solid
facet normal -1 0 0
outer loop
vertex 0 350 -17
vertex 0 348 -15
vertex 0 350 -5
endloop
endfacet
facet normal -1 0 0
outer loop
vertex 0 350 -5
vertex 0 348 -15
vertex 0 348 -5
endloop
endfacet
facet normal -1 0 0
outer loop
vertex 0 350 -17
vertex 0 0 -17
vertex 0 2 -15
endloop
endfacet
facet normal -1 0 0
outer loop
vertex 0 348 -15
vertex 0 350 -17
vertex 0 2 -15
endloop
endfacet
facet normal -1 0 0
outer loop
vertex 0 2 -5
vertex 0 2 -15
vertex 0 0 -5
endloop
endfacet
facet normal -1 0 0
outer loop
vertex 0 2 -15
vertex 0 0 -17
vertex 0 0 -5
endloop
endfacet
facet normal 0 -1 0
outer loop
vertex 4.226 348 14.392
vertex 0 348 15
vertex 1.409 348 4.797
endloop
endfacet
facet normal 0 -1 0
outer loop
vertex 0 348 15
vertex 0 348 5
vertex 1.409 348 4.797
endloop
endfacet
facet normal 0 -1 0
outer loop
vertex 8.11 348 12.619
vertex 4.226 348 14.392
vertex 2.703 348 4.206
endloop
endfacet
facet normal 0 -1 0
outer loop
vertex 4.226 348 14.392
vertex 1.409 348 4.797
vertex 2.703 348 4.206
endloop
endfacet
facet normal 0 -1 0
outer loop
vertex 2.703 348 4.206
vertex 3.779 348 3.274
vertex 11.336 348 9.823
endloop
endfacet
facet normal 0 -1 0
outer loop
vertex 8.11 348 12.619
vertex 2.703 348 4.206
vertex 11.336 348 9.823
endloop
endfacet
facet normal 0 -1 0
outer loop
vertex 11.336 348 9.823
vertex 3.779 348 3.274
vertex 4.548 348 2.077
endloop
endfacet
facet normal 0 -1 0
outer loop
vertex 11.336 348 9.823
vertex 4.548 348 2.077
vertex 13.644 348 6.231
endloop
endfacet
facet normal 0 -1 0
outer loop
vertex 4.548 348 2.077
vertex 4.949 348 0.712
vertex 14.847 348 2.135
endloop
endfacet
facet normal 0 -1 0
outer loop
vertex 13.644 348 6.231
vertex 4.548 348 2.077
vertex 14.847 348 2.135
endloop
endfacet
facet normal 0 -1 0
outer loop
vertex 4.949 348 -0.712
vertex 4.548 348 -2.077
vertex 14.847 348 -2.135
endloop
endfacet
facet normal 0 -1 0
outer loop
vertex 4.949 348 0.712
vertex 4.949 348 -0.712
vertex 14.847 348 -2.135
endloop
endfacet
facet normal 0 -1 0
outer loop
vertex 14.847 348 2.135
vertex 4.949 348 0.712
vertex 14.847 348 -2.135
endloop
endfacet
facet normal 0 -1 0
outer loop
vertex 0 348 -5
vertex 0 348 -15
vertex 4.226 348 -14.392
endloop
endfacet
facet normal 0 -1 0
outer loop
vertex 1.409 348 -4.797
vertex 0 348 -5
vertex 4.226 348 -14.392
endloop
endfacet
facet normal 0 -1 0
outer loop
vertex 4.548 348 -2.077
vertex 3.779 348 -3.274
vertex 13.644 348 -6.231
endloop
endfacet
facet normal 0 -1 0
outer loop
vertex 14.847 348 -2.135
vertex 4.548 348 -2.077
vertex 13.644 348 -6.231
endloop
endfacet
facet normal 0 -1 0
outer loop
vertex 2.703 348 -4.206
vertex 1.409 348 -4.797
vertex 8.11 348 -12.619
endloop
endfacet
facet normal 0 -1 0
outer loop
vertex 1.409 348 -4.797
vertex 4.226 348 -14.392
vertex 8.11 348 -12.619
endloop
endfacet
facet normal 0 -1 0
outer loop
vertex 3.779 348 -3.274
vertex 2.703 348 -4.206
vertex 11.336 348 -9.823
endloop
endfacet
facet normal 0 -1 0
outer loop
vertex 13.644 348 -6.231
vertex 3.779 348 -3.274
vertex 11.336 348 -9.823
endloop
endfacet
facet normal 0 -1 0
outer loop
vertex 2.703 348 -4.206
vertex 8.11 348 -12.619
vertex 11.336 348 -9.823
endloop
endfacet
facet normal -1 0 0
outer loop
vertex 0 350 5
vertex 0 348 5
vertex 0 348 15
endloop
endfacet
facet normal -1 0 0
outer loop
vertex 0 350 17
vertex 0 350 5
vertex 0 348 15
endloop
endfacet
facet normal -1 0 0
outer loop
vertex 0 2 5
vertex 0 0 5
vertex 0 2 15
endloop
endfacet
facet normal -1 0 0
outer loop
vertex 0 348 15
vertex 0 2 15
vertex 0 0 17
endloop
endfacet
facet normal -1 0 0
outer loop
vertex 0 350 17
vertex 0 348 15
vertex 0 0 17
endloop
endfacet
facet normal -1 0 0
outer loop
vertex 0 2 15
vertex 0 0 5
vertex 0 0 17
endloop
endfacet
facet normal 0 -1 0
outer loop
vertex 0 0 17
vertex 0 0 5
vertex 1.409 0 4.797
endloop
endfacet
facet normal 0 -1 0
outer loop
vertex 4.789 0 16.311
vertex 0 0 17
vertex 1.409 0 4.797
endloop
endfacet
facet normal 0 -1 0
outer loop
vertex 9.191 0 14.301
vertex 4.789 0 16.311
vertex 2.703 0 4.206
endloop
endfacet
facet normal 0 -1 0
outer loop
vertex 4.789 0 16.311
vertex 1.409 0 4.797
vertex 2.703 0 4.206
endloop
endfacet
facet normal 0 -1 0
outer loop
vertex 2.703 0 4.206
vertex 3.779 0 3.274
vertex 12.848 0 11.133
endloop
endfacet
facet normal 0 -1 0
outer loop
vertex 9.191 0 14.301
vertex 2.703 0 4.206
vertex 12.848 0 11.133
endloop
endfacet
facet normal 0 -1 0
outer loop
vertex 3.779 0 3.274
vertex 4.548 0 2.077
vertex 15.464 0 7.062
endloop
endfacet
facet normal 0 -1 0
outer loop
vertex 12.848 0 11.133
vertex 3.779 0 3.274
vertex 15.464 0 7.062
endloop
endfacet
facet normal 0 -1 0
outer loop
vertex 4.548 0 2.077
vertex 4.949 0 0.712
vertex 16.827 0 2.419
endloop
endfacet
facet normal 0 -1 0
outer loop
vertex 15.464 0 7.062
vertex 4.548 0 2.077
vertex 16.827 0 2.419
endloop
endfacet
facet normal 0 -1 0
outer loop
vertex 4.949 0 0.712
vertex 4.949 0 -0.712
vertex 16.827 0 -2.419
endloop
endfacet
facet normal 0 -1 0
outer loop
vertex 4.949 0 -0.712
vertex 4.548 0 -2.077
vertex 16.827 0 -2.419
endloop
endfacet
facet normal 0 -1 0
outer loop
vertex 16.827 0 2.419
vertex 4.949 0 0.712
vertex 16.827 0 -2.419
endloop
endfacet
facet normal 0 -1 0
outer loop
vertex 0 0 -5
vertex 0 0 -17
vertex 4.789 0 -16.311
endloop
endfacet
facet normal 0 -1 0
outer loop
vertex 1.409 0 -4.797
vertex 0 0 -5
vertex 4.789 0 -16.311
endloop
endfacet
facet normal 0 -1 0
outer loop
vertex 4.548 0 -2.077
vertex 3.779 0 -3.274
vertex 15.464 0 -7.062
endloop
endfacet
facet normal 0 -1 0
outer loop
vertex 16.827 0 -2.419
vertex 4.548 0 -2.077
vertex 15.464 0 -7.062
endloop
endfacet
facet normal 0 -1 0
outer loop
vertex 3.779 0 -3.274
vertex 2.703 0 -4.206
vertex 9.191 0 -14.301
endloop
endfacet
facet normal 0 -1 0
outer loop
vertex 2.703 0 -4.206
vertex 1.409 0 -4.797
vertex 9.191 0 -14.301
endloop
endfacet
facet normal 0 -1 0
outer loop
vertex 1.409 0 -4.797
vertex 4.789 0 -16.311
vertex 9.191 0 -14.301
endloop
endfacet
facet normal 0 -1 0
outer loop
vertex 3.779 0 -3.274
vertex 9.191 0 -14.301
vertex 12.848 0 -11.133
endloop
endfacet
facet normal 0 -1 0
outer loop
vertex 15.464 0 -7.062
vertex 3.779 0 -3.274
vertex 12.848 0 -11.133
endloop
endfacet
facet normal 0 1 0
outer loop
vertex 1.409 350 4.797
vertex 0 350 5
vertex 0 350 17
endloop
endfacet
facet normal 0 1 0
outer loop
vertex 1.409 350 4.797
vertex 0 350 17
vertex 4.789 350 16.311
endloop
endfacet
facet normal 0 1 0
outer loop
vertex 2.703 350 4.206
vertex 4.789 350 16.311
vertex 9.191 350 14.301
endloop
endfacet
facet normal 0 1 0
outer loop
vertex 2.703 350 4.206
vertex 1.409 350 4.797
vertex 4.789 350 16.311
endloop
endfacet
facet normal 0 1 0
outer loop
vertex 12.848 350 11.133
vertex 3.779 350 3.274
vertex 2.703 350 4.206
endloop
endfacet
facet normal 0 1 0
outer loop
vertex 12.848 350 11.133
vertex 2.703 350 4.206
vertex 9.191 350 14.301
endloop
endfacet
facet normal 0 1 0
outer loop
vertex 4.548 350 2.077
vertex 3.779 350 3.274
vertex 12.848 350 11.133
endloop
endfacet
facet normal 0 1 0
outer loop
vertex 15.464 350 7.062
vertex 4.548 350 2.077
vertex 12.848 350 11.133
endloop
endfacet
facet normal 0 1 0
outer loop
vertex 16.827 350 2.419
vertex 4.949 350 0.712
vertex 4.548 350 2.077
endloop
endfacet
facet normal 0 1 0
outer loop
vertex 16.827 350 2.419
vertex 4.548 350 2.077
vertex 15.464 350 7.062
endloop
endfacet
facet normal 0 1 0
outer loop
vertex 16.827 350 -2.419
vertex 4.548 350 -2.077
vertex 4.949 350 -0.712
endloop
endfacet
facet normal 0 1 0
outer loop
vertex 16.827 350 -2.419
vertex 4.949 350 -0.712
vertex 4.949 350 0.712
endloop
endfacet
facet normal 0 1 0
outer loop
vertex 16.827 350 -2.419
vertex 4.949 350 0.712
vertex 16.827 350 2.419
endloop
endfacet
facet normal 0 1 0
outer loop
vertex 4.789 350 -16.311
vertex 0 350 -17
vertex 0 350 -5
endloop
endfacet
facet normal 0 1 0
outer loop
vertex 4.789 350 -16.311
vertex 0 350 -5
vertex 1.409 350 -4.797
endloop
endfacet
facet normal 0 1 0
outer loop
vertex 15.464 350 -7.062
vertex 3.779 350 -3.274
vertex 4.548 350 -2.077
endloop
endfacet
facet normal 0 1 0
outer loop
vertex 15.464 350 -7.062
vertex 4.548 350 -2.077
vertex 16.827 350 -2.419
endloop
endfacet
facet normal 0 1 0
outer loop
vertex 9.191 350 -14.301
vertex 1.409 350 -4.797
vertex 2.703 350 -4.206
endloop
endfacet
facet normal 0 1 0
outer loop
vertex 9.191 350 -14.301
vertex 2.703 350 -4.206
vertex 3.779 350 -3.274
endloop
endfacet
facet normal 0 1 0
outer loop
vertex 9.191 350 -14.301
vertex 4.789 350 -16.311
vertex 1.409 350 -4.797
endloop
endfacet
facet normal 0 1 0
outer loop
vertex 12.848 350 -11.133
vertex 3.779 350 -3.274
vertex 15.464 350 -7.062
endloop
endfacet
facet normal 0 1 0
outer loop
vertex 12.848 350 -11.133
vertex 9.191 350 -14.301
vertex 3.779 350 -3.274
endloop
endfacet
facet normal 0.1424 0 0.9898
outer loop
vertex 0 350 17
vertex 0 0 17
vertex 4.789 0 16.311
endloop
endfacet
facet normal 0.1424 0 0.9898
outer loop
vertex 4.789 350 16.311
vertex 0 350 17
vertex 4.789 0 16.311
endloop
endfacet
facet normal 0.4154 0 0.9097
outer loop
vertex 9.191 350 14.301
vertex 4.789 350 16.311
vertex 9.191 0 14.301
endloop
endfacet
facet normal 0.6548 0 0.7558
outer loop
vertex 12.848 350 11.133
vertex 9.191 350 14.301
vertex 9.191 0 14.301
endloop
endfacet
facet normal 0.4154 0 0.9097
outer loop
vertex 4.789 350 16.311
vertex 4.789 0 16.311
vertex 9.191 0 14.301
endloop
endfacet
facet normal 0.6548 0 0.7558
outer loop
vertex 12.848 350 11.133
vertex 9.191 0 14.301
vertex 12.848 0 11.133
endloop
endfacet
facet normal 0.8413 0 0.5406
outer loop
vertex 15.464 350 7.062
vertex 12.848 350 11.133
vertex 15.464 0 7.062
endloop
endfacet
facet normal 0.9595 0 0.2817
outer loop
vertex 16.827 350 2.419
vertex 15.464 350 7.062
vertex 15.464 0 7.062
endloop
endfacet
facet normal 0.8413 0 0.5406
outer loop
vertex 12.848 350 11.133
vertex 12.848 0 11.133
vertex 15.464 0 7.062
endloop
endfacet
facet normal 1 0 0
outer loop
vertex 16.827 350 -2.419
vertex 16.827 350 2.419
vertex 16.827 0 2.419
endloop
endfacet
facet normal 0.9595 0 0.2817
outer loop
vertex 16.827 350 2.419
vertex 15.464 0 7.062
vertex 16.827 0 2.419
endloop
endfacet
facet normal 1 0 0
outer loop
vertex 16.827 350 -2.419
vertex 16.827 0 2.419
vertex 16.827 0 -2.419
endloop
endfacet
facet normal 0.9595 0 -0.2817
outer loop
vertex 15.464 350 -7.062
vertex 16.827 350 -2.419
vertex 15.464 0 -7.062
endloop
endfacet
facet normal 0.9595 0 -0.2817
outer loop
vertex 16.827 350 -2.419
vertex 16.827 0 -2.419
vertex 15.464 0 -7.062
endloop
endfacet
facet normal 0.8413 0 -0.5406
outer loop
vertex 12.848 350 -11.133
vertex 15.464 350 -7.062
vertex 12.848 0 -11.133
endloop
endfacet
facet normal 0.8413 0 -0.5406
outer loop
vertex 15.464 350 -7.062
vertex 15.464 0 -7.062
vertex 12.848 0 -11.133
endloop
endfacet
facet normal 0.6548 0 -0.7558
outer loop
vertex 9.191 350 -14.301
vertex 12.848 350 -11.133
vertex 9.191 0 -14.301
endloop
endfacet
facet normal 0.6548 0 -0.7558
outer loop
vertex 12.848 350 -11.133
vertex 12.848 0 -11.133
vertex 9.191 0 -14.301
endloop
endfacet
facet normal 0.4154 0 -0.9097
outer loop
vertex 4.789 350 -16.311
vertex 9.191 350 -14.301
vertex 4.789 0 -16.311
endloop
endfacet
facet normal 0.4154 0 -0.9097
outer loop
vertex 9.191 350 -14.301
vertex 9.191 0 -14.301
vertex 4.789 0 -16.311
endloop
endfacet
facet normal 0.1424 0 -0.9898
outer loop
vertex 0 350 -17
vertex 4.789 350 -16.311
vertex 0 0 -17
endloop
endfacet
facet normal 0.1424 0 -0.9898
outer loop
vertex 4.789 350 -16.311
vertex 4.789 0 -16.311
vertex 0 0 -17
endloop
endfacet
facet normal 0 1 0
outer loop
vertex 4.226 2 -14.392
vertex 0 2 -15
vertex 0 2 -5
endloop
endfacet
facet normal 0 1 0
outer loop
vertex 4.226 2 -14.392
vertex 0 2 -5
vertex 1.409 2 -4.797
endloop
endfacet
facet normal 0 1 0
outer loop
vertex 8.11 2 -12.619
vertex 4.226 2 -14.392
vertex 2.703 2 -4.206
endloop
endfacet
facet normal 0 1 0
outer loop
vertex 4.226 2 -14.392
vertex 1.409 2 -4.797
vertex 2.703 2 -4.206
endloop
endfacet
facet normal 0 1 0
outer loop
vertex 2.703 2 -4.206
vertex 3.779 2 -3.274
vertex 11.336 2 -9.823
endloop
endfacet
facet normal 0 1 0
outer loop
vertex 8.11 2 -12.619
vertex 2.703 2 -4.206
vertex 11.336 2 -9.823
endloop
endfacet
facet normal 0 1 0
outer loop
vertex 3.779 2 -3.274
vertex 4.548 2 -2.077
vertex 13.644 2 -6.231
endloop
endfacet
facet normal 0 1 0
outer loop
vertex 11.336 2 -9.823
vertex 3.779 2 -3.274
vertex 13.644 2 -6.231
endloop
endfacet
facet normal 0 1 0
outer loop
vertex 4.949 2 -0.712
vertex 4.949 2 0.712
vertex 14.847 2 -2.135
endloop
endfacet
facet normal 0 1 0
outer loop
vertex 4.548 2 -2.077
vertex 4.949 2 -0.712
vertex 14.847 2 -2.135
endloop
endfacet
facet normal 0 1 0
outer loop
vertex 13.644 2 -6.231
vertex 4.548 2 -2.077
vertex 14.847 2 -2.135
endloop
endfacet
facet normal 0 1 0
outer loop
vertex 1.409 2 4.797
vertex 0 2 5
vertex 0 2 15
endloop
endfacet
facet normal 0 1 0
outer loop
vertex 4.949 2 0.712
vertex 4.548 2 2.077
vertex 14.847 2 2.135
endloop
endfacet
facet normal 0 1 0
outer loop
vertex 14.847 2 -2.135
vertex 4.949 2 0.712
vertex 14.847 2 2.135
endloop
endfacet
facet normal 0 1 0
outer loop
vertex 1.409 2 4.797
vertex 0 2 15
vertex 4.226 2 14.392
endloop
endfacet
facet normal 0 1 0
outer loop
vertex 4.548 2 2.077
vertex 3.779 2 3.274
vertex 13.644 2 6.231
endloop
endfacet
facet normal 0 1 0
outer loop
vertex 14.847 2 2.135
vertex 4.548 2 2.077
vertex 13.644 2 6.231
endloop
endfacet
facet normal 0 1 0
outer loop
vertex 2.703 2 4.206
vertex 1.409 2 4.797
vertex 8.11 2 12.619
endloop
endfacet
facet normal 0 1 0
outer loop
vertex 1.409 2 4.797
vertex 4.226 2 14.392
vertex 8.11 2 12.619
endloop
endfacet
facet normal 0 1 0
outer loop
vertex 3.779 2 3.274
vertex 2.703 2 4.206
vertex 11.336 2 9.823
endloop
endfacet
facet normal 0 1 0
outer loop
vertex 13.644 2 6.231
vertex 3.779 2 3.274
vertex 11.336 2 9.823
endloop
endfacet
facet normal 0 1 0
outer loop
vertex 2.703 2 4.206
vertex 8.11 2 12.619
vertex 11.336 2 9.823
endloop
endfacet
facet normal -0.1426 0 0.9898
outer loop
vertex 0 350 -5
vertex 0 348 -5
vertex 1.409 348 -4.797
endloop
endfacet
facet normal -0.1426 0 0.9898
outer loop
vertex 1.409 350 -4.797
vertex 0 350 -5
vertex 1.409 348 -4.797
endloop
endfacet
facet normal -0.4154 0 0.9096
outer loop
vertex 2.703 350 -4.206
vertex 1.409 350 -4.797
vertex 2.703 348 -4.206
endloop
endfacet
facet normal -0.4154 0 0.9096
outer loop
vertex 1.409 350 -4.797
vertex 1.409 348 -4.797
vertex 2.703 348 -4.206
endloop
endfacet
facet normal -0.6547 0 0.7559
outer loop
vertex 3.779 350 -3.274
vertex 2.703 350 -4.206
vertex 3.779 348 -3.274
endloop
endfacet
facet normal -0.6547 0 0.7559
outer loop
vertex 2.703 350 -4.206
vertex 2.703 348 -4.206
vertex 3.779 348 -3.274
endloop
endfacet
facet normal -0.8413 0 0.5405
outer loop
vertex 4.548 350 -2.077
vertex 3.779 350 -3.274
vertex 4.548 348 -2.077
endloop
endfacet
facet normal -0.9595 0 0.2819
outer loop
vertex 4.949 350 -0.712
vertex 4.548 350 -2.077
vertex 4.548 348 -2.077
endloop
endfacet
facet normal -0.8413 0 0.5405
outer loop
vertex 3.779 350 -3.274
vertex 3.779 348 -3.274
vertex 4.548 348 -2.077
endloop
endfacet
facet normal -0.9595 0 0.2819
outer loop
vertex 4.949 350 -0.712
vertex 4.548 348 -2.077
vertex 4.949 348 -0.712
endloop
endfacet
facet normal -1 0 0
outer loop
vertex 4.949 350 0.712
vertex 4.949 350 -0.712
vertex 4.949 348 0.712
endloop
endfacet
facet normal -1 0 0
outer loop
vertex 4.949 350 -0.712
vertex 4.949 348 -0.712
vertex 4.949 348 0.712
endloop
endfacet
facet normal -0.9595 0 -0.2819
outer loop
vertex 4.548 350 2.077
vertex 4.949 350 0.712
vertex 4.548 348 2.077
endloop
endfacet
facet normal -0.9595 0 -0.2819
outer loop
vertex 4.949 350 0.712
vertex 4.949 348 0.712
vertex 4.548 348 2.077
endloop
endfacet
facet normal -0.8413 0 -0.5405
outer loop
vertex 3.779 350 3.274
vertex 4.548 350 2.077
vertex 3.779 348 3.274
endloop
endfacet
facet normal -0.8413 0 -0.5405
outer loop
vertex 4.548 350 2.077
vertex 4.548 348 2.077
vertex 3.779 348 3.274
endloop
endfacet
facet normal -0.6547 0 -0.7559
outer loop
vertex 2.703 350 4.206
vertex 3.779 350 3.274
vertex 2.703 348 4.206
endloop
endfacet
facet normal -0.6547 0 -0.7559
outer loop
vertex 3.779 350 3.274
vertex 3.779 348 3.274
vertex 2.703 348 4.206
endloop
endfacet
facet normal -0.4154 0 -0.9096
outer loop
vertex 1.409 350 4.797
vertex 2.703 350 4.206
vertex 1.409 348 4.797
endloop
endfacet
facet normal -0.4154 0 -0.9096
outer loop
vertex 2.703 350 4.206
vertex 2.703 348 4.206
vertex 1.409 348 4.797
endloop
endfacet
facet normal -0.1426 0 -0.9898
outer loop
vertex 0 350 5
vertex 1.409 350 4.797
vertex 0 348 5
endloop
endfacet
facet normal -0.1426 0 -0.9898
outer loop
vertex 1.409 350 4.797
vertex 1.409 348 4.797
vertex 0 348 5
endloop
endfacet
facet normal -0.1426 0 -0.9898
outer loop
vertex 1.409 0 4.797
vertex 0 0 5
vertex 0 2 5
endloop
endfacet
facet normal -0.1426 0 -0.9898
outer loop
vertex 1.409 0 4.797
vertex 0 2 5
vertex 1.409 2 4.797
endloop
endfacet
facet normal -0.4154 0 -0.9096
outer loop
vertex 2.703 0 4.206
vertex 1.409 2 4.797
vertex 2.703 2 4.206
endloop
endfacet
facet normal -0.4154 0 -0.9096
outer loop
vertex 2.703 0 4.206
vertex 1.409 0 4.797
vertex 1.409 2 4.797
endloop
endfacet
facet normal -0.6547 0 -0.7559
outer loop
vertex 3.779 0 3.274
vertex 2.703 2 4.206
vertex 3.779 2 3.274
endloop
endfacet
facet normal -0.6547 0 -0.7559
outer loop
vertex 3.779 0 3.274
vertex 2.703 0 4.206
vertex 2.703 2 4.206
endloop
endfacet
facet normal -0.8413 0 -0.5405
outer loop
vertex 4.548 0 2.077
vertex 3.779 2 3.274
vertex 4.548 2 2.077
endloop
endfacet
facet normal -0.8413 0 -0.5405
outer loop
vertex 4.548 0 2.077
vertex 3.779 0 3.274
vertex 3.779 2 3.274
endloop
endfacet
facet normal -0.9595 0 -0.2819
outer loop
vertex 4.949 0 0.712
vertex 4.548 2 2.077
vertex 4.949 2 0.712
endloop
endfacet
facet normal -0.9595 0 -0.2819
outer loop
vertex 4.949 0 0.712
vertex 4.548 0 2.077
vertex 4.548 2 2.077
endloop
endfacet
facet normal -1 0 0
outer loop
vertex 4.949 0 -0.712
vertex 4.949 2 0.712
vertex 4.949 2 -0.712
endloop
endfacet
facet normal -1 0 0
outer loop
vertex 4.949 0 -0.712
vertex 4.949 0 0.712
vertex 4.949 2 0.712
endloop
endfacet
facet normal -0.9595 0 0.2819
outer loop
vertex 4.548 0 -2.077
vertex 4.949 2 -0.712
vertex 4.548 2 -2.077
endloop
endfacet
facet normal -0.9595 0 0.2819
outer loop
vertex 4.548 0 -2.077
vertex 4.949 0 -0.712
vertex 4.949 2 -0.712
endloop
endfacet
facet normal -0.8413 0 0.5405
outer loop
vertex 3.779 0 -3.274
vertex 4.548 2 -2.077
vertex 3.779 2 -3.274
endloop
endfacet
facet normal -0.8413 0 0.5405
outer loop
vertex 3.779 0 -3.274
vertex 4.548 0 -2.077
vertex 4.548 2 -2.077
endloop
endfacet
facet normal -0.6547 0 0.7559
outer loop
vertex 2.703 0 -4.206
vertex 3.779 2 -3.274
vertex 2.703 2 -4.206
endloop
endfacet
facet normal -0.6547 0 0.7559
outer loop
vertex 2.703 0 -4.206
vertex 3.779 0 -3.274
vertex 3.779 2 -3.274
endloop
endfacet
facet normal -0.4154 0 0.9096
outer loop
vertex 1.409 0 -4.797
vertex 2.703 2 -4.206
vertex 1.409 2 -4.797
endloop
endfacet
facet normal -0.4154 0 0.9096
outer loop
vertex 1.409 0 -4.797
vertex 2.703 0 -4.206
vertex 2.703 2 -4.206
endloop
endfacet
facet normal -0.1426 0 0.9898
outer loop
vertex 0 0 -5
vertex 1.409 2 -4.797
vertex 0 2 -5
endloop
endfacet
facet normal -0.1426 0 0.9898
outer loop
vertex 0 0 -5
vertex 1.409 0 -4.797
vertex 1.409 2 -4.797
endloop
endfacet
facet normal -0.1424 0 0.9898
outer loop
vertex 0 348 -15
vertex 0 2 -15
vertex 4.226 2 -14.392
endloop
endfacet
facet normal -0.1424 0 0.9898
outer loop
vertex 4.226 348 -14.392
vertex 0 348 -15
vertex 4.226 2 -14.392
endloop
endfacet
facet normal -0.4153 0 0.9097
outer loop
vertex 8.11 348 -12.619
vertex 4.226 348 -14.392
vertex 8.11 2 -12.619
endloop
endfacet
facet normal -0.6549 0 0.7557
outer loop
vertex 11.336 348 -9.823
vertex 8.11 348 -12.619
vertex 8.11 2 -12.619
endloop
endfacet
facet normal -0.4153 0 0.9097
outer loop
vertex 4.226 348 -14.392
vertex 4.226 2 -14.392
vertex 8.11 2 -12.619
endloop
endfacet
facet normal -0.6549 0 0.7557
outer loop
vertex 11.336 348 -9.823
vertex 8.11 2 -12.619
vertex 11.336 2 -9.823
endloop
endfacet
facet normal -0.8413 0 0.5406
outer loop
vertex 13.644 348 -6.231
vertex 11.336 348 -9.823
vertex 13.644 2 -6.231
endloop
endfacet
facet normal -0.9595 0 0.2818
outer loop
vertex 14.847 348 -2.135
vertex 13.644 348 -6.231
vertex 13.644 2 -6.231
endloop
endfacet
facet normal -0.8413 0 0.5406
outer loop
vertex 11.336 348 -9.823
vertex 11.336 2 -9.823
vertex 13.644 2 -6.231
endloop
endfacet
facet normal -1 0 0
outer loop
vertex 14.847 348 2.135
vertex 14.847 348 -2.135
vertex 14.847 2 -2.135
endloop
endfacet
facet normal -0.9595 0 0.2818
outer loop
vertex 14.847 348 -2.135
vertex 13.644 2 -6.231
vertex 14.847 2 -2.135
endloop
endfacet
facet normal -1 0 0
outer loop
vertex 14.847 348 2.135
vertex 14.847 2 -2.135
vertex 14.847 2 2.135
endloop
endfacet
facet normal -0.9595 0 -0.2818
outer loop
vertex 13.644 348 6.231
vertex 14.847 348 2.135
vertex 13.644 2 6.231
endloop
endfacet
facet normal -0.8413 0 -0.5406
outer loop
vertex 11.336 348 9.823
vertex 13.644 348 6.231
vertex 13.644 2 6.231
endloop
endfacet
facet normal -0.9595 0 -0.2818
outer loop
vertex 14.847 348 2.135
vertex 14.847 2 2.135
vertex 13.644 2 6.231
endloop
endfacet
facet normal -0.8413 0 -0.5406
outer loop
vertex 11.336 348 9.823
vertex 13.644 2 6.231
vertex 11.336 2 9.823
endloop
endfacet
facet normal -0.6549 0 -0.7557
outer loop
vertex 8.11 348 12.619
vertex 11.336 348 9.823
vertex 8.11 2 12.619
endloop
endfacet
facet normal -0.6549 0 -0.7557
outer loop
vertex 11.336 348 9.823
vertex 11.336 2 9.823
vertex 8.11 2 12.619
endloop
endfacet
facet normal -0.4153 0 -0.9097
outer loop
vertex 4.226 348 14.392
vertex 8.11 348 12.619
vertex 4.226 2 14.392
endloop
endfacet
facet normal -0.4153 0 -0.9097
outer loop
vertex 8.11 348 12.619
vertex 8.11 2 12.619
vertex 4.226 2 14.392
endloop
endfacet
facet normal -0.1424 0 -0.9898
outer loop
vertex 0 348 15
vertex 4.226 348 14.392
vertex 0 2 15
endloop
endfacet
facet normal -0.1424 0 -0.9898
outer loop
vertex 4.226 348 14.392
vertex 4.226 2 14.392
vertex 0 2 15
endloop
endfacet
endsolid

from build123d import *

# Parameters (mm, degrees)
EXTRUDE_1_DEPTH = 350
EXTRUDE_START   = -2
EXTRUDE_2_DEPTH = 2
EXTRUDE_3_DEPTH = 2


with BuildPart() as part:
    # 草图1 → 凸台-拉伸1 (new body)
    with BuildSketch(Plane(origin=(0, 0, 0), x_dir=(1, 0, 0), z_dir=(0, 1, 0))):
        with BuildLine():
            Line((0, 17), (0, 15))
            ThreePointArc((0, 15), (15, 0), (0, -15))
            Line((0, -15), (0, -17))
            ThreePointArc((0, -17), (17, 0), (0, 17))
        make_face()
    extrude(amount=EXTRUDE_1_DEPTH)

    # 草图2 → 凸台-拉伸2 (add)
    with BuildSketch(Plane(origin=(0, 350, 0), x_dir=(1, 0, 0), z_dir=(0, 1, 0)).offset(EXTRUDE_START)):
        with BuildLine():
            Line((0, 17), (0, 5))
            ThreePointArc((0, 5), (5, 0), (0, -5))
            Line((0, -5), (0, -17))
            ThreePointArc((0, -17), (17, 0), (0, 17))
        make_face()
    extrude(amount=EXTRUDE_2_DEPTH)

    # 草图3 → 凸台-拉伸3 (add)
    with BuildSketch(Plane.XZ):
        with BuildLine():
            Line((0, 17), (0, 5))
            ThreePointArc((0, 5), (5, 0), (0, -5))
            Line((0, -5), (0, -17))
            ThreePointArc((0, -17), (17, 0), (0, 17))
        make_face()
    extrude(amount=-EXTRUDE_3_DEPTH)


solid = part.part
